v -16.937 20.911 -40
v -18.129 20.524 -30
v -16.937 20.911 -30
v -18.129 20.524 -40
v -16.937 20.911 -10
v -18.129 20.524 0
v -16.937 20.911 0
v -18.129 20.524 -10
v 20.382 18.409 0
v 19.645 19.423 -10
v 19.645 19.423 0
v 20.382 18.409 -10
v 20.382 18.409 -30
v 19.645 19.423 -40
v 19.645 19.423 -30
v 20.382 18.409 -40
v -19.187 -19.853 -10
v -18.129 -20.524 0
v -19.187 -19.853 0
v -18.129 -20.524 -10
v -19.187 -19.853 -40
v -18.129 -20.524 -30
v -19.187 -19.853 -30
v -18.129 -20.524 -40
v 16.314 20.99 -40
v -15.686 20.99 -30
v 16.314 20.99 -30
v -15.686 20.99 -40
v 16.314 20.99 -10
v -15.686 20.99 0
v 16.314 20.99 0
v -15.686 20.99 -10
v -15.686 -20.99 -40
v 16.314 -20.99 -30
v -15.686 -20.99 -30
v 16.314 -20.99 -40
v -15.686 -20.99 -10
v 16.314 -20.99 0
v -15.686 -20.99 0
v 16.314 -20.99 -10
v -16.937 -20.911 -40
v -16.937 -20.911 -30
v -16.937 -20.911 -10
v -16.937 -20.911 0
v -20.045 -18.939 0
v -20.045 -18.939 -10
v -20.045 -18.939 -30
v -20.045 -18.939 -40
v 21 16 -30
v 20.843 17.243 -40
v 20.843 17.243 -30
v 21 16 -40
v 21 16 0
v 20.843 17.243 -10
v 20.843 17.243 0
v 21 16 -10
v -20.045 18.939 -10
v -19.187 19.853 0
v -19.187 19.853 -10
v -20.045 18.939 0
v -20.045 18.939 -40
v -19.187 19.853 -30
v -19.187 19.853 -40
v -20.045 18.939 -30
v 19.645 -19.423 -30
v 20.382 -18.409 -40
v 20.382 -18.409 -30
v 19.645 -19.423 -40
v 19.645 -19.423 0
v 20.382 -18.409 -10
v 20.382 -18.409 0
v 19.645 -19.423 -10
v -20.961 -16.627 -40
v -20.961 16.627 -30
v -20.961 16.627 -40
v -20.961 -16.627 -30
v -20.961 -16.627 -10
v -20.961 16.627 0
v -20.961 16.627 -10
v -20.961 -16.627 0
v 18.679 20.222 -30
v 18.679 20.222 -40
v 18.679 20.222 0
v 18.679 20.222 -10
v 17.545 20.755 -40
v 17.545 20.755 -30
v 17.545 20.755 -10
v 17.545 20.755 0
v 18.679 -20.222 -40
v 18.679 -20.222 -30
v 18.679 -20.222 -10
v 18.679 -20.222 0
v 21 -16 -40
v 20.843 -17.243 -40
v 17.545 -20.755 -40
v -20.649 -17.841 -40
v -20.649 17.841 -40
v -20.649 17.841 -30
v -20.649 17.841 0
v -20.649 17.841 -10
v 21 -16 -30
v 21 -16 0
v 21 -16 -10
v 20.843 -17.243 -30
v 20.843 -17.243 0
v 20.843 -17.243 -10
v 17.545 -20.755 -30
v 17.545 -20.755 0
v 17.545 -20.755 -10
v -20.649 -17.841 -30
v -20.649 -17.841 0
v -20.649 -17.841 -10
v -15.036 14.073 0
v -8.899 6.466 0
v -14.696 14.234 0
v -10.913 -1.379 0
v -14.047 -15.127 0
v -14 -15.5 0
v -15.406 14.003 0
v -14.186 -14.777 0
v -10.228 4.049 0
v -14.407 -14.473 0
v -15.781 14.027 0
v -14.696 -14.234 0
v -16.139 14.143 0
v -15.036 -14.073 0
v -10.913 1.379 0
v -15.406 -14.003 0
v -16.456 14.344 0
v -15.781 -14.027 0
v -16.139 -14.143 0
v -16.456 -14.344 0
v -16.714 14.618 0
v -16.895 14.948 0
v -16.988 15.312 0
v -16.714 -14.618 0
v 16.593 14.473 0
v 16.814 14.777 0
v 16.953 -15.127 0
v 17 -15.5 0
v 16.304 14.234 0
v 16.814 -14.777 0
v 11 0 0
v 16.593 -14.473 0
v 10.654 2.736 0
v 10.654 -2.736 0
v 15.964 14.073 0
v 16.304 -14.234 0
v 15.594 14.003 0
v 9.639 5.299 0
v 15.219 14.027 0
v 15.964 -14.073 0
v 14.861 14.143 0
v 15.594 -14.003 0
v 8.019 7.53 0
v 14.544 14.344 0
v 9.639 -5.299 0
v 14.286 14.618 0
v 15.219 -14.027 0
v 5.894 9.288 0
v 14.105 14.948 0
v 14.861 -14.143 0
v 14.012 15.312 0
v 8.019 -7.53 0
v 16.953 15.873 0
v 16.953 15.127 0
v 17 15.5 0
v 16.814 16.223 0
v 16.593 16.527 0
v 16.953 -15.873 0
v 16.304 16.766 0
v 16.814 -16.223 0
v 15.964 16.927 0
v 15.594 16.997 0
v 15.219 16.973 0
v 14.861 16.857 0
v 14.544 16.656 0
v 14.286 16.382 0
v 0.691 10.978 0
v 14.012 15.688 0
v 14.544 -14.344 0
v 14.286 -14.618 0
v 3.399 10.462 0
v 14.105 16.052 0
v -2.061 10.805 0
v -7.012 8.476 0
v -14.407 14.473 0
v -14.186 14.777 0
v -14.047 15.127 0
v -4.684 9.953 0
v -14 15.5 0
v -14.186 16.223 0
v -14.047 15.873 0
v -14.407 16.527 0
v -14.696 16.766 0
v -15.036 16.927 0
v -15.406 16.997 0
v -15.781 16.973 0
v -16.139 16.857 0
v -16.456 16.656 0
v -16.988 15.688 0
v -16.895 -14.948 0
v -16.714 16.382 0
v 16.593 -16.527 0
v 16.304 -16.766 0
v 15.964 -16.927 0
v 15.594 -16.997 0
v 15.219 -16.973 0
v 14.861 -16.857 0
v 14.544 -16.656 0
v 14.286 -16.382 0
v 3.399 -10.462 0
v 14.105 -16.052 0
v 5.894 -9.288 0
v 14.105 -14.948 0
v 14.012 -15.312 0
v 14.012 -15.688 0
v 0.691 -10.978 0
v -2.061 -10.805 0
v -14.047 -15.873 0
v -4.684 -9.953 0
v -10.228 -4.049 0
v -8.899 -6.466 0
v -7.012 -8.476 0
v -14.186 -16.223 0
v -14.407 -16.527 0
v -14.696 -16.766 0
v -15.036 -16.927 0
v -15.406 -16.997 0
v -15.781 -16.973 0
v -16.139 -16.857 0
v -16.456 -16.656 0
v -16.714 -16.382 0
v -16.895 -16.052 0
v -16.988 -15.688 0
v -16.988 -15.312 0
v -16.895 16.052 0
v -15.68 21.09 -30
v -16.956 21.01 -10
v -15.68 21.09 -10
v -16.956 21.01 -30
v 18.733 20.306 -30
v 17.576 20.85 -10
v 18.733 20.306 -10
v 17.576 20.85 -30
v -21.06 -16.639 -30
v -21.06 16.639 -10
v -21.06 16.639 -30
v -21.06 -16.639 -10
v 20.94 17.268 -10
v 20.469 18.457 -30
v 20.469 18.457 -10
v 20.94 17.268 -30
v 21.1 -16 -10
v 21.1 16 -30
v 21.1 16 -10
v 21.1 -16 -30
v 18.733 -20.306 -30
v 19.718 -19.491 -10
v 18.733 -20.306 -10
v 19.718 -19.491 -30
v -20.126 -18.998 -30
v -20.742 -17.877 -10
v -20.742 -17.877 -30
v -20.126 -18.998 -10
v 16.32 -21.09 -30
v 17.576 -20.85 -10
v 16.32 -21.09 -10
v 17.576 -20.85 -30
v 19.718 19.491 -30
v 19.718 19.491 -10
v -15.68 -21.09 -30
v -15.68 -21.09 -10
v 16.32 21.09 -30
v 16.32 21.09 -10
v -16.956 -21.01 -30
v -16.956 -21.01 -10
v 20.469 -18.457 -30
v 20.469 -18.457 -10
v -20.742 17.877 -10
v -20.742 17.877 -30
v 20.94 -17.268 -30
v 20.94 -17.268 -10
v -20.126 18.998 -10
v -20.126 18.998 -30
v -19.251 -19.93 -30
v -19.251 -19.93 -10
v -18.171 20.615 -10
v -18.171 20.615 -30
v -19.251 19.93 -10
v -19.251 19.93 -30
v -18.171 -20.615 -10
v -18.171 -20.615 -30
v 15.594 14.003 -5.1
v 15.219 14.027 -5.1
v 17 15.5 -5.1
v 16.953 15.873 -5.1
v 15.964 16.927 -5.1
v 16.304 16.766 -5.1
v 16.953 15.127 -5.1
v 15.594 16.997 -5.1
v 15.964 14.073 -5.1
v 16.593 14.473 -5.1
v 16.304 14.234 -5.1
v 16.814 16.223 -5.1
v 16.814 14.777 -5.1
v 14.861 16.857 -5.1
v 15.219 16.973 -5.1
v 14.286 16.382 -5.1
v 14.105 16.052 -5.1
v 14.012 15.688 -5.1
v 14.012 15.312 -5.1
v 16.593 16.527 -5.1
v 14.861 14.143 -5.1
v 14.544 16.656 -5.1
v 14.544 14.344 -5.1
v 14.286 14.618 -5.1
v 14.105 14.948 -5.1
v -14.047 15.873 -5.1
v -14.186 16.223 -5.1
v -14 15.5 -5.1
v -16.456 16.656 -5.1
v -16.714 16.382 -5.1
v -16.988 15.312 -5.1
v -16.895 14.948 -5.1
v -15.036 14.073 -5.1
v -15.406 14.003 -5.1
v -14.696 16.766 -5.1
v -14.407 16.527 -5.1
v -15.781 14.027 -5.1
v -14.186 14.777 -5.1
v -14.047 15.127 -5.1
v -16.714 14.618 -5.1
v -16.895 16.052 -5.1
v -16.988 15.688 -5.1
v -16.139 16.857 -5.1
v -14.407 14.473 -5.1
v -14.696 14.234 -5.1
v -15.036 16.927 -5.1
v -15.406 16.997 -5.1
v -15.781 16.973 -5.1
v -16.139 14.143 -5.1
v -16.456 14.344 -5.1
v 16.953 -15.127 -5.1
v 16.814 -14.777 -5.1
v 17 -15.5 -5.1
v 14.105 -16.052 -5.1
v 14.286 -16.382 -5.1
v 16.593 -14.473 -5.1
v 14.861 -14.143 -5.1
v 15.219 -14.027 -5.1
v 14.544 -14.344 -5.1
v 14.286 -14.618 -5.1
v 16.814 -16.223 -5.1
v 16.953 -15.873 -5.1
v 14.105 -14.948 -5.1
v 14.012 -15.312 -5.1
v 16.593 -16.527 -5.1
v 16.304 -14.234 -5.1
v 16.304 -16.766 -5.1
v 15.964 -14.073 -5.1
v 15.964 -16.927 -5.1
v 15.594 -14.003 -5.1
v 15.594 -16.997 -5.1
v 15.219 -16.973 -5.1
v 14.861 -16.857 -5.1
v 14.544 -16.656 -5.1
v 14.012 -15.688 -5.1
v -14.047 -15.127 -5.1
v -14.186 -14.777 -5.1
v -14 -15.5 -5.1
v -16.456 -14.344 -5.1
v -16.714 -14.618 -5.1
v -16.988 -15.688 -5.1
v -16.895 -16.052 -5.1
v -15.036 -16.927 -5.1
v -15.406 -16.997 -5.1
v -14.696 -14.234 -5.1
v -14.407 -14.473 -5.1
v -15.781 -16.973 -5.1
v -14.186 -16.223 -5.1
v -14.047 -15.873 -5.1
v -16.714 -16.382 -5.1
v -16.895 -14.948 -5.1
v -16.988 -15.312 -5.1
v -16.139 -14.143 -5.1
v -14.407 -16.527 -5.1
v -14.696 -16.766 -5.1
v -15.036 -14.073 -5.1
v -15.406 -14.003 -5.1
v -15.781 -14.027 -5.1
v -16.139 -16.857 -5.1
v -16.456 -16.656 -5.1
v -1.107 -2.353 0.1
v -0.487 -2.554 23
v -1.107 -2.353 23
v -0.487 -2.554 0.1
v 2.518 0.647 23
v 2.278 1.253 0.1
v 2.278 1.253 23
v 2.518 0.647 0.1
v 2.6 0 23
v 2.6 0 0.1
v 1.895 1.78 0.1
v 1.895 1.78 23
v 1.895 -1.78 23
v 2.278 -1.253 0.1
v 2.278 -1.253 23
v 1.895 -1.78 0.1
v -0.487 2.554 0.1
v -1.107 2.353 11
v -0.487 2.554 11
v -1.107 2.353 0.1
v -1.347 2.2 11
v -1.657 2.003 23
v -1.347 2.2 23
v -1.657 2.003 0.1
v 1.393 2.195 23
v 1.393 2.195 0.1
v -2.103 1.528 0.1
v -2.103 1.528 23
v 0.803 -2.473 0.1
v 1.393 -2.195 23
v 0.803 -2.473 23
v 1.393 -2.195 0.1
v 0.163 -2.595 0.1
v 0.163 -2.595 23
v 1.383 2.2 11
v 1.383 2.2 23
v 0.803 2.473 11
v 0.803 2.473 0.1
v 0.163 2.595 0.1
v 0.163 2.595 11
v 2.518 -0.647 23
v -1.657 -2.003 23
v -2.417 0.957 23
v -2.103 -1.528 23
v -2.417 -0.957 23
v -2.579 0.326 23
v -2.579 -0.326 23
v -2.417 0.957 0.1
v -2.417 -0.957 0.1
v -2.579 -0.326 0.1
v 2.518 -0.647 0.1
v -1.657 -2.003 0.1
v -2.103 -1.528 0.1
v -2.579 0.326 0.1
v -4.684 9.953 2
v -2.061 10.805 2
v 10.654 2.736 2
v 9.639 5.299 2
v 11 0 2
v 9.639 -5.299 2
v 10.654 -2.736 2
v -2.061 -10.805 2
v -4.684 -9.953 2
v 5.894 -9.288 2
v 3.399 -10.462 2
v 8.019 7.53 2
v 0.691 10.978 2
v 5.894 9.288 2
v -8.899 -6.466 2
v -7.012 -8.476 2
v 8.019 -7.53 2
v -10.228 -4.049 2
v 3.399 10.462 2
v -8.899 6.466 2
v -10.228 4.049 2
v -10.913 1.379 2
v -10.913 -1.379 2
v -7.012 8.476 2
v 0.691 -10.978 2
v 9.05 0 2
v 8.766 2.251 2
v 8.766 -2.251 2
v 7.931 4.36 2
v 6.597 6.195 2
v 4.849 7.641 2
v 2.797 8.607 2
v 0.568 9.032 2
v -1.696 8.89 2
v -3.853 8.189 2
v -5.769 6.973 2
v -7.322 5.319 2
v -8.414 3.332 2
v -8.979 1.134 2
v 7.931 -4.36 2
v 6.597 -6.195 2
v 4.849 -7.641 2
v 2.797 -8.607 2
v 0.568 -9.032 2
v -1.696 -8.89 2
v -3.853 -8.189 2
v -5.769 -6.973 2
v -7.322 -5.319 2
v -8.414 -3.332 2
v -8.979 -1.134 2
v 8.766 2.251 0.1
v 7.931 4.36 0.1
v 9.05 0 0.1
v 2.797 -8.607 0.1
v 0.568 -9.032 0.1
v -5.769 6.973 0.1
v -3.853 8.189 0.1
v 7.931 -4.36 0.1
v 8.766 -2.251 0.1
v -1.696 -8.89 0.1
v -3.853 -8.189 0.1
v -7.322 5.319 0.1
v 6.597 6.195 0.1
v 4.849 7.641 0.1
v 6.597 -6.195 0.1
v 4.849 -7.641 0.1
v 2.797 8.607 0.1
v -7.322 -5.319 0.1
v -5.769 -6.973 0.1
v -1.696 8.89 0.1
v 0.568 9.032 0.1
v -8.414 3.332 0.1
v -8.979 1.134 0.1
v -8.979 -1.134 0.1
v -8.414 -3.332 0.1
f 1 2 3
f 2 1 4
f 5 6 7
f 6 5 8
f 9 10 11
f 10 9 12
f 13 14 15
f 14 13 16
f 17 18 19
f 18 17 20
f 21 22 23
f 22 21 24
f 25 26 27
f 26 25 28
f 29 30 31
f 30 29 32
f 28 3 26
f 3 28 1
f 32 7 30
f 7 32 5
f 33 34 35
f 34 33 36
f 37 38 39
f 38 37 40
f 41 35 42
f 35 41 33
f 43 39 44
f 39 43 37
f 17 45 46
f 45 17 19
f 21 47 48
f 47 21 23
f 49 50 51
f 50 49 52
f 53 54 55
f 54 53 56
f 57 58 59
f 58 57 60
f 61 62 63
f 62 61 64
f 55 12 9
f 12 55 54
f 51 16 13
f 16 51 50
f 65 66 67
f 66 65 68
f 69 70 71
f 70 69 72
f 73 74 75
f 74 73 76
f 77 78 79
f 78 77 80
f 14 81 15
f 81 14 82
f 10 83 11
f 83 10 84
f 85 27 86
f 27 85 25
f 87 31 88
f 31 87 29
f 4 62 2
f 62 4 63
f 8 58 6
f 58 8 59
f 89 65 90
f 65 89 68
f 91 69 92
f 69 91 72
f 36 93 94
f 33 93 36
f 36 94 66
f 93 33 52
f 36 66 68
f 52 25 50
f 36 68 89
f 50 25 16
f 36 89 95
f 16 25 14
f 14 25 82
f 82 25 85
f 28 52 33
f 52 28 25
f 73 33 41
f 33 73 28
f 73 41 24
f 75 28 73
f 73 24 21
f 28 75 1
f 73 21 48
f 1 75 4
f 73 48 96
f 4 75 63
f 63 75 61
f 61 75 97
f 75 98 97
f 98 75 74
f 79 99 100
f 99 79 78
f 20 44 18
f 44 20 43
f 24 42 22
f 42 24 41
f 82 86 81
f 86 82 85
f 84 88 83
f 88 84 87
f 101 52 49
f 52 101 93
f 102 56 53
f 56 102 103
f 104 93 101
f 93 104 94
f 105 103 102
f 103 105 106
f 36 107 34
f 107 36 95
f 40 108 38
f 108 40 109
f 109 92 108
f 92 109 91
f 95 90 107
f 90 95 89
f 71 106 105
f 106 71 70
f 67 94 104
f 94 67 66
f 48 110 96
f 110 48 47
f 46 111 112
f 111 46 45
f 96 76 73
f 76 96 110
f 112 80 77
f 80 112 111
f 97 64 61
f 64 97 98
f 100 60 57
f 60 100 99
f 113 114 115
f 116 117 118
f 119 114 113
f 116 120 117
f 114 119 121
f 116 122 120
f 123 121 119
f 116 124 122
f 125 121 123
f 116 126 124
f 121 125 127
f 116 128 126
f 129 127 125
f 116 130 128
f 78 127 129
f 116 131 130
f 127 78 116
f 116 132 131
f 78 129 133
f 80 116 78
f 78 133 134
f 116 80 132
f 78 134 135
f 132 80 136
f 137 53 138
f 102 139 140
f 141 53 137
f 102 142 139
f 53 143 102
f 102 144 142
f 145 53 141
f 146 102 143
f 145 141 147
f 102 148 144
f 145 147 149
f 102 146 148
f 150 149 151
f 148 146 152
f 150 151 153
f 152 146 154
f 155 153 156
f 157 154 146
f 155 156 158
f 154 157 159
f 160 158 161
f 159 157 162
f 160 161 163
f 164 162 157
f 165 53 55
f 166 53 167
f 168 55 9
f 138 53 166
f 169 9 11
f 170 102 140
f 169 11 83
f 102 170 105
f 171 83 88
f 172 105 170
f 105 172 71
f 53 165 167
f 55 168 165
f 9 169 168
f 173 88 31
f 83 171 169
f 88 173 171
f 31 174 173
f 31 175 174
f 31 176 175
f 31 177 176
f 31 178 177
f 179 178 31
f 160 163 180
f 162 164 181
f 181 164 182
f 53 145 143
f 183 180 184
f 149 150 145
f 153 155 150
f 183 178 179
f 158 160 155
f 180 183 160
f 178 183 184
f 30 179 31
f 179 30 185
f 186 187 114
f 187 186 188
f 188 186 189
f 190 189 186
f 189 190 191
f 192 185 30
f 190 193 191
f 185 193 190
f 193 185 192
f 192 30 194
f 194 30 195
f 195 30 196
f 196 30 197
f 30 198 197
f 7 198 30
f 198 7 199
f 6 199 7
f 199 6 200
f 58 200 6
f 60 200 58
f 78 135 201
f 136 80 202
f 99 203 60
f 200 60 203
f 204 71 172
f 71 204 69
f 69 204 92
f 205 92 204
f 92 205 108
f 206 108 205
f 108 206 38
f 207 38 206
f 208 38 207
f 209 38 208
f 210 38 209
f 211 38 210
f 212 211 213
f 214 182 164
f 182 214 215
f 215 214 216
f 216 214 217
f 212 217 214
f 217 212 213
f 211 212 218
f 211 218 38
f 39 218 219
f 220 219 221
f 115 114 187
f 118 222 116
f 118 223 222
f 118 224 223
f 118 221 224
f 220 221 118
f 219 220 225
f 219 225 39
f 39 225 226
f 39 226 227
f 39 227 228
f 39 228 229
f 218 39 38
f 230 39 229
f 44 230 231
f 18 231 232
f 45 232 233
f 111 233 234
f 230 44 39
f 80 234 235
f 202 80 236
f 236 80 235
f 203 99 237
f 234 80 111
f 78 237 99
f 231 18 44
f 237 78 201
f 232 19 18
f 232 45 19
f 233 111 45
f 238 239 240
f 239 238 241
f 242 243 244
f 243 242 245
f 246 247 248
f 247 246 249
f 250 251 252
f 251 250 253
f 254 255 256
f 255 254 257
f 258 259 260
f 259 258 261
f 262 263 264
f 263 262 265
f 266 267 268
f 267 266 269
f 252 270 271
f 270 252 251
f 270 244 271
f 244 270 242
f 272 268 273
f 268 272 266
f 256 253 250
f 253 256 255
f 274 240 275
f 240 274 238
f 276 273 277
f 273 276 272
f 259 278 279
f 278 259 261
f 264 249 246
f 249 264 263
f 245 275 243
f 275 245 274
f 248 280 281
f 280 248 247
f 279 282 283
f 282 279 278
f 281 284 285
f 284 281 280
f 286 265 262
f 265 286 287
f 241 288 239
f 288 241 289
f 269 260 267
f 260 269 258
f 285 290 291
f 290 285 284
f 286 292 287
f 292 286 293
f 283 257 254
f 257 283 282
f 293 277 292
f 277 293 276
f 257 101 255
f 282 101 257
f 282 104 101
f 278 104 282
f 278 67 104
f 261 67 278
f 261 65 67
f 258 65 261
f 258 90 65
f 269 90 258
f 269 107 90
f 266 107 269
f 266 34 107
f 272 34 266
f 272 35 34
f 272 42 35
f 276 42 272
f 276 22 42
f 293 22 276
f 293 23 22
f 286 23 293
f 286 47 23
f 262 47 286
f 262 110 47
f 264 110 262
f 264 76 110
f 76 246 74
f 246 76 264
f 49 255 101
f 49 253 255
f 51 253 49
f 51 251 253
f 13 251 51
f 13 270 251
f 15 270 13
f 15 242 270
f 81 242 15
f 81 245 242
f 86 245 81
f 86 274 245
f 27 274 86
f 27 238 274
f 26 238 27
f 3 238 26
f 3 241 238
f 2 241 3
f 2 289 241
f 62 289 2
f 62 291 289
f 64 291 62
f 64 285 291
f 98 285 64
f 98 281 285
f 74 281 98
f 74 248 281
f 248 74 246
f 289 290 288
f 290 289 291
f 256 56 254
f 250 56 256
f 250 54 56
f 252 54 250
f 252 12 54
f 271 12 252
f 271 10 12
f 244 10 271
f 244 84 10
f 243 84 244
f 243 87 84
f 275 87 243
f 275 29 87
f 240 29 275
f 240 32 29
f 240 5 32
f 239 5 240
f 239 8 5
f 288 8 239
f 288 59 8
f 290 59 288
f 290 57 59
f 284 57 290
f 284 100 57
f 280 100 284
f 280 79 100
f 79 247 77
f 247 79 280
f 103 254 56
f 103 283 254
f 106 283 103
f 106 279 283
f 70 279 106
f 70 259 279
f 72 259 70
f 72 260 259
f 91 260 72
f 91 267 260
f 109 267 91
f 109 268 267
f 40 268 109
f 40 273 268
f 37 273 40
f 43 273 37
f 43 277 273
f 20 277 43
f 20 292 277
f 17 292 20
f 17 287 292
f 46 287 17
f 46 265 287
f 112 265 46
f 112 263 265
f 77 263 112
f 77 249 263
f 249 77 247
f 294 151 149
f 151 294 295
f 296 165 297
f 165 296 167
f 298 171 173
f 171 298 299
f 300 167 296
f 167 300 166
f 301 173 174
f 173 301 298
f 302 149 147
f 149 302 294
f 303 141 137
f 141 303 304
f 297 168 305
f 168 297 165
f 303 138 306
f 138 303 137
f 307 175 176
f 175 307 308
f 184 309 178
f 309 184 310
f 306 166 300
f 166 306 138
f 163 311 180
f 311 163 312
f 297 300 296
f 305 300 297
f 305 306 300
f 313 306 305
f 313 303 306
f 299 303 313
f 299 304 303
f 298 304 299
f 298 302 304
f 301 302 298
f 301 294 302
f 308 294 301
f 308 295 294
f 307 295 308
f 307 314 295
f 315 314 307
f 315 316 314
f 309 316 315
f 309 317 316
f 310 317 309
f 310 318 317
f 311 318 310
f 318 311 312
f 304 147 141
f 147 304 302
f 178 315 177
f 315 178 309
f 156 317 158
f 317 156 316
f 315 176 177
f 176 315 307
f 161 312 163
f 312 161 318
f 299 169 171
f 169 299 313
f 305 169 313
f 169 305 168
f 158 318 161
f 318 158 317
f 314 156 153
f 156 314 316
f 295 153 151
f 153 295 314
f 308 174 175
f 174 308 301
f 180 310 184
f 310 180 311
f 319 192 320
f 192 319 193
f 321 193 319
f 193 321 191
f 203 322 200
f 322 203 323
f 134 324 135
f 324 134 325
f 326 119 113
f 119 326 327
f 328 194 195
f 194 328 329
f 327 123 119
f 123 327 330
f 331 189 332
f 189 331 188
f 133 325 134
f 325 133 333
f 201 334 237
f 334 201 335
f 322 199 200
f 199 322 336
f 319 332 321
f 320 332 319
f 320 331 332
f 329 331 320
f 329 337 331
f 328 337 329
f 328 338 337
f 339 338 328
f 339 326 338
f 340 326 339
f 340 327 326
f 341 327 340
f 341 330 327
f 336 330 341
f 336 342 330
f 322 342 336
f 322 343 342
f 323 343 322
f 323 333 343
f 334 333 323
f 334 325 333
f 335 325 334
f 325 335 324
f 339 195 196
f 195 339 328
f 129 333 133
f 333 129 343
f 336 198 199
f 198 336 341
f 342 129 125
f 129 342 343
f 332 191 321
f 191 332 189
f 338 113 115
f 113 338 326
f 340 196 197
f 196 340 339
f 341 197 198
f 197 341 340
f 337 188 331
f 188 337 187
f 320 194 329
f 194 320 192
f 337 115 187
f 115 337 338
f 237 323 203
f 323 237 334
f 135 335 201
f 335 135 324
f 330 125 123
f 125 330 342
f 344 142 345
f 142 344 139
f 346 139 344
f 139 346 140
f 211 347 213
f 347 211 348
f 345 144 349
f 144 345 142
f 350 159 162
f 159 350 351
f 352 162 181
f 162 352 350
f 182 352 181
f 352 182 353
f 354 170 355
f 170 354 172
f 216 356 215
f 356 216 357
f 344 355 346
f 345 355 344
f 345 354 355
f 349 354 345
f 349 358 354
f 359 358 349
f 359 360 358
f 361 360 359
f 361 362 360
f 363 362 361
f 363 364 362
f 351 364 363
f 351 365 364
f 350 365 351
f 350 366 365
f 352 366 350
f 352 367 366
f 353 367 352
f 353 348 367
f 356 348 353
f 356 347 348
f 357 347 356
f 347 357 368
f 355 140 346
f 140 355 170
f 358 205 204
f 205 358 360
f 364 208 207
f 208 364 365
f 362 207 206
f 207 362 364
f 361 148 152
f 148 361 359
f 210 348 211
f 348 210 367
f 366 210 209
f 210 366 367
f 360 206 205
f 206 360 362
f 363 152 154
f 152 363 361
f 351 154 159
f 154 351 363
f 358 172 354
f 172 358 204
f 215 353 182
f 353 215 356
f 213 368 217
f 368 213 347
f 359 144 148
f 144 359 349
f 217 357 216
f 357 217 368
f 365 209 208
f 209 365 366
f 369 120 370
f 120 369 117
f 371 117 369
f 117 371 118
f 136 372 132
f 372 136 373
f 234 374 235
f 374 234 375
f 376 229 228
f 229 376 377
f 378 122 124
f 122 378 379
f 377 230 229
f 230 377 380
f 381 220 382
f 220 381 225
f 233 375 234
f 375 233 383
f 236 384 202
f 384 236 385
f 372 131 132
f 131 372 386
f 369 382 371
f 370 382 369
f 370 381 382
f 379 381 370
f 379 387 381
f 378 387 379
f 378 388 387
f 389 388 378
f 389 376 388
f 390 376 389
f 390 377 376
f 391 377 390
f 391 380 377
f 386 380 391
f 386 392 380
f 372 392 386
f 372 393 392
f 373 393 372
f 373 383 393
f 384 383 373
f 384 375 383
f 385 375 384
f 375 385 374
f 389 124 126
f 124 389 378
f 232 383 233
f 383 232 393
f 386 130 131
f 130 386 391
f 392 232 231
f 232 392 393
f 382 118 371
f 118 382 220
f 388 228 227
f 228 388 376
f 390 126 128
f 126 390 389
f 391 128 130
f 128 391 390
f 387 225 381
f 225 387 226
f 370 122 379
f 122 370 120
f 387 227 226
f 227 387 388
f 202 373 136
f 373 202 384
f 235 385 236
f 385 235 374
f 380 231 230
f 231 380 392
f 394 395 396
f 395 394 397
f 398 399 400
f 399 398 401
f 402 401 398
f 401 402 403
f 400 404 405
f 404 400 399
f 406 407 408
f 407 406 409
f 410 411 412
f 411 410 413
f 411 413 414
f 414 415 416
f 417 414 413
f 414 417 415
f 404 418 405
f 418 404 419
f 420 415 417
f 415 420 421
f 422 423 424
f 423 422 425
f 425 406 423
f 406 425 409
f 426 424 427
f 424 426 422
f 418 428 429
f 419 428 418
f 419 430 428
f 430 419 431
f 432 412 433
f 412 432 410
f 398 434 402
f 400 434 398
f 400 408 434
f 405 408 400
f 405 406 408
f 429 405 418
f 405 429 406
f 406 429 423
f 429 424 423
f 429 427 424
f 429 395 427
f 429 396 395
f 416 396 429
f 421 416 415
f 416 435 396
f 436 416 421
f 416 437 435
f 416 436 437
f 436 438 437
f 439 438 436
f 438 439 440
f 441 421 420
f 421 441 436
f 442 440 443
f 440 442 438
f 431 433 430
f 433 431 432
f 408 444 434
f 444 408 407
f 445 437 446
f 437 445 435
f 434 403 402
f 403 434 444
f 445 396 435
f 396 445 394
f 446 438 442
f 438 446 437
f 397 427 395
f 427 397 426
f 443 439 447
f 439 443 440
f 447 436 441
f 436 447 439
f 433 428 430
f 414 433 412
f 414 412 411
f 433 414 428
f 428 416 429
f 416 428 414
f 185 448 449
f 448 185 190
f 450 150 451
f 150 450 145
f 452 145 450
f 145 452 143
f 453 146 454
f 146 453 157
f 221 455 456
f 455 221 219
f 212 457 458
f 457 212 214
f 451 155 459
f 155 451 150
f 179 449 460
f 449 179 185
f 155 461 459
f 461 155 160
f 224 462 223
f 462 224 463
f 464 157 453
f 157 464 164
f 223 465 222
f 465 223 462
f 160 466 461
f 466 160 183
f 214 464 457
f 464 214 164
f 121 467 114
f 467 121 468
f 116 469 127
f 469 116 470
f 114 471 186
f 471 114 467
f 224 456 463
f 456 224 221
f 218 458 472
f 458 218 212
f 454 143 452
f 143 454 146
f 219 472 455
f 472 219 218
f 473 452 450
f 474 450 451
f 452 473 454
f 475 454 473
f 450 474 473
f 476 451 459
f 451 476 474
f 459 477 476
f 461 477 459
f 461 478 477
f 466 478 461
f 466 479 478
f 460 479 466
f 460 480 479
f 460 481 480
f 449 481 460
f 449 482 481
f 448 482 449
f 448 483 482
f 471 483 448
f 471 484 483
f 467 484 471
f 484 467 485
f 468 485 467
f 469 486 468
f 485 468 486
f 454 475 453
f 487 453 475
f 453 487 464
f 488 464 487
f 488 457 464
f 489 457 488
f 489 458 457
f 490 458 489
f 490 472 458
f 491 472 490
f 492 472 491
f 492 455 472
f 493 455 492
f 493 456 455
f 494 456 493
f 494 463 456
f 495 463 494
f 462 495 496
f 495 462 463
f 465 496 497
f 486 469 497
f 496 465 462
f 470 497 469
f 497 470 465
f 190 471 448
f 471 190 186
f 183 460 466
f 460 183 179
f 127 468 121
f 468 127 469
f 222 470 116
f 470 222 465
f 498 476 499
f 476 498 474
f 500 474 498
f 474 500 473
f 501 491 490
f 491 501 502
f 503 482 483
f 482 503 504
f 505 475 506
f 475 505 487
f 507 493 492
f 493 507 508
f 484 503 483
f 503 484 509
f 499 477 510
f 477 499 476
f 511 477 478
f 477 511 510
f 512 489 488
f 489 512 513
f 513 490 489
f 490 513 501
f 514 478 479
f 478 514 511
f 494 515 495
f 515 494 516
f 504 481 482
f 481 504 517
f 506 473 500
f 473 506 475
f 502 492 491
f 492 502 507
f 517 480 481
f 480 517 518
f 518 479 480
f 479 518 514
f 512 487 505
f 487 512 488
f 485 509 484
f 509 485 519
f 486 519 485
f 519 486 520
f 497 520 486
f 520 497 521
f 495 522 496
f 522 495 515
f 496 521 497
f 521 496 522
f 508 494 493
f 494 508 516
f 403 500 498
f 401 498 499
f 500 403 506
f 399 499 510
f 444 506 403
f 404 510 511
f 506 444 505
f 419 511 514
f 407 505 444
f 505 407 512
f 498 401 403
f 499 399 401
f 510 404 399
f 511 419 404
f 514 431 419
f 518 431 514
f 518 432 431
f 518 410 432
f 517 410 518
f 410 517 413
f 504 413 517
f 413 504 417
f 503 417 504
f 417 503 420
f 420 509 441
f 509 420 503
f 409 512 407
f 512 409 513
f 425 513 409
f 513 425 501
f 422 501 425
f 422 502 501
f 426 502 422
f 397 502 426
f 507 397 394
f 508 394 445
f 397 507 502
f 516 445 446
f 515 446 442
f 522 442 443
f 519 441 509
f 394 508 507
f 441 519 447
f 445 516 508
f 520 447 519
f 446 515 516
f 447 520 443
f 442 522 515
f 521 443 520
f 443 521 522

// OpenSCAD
$fn=25;

module nema_17(motor_height = 40, shaft_diameter = 5.2, shaft_flat = 0.2)
{
    rotate(a=90, v=[-1,0,0])
    nema(motor_size = 42, motor_height = 40, shaft_diameter = 5.2, shaft_flat = 0.2);
}

nema_17();

module nema(motor_size=42, motor_height = 38, shaft_diameter = 5.2, shaft_flat = 0.2) {

realDelta = 6;

	difference() {

    union()
    {
        color("silver")
        // Motor base
		translate([0,motor_height/2,0]) rotate([90,0,0]) hull() {
			translate([-(motor_size/2-5),(motor_size/2-5),0]) cylinder(r=5,h=motor_height, center = true);
			translate([(motor_size/2-5),(motor_size/2-5),0]) cylinder(r=5,h=motor_height, center = true);
			translate([-(motor_size/2-5),-(motor_size/2-5),0]) cylinder(r=5,h=motor_height, center = true);
			translate([(motor_size/2-5),-(motor_size/2-5),0]) cylinder(r=5,h=motor_height, center = true);
		}
        color("black")
        translate([0,motor_height/2,0]) rotate([90,0,0]) hull() {
            translate([-(motor_size/2-5),(motor_size/2-5),0]) cylinder(r=5.1,h=motor_height/2, center = true);
            translate([(motor_size/2-5),(motor_size/2-5),0]) cylinder(r=5.1,h=motor_height/2, center = true);
            translate([-(motor_size/2-5),-(motor_size/2-5),0]) cylinder(r=5.1,h=motor_height/2, center = true);
            translate([(motor_size/2-5),-(motor_size/2-5),0]) cylinder(r=5.1,h=motor_height/2, center = true);
        }
    }


        // Mount holes
        union() {
		translate([15.5,0.1,15.5]) rotate([90,0,0]) cylinder(r=1.5,h=10, center = true);
		translate([-15.5,0.1,15.5]) rotate([90,0,0]) cylinder(r=1.5,h=10, center = true);
		translate([15.5,0.1,-15.5]) rotate([90,0,0]) cylinder(r=1.5,h=10, center = true);
		translate([-15.5,0.1,-15.5]) rotate([90,0,0]) cylinder(r=1.5,h=10, center = true);
        }
	}
    color("silver")
    // Motor shaft
	translate([0,-10,0]) rotate([90,0,0])
    difference() {    
        cylinder(r=shaft_diameter/2,h=20+realDelta, center = true); 
        translate([-shaft_diameter/2,(shaft_diameter/2)-shaft_flat*2,1])
        cube([shaft_diameter,shaft_diameter/2,10+realDelta]);
    }
    color("gray")
    // The ring around the motor shaft
	difference() {
		translate([0,-1,0]) rotate([90,0,0]) cylinder(r=11,h=2, center = true);
		translate([0,-1.1,0]) rotate([90,0,0]) cylinder(r=9.05,h=2, center = true);
	}
}

module nema_holes(places=[1,1,1,1], size=15.5, h=10, holes=false, shadow=false, $fn=8){
    for (i=[0:3]) {
        if (places[i] == 1) {
            rotate([0, 0, 90*i]) translate([size, size, 0]) {
                if (holes) {
                    rotate([0, 0, -90*i]) translate([0,0,0]) rotate([0,0,90]) cylinder_poly(h = h+0.1, r = M3/2);
					rotate([0, 0, -90*i]) translate([0,0,h]) rotate([0,0,22.5]) cylinder(h = h, r = M3*2.2/2, $fn = $fn);
                } else {
                    rotate([0, 0, -90*i]) cylinder(h=h, r=4, $fn=$fn);
                }
            }
        }
    }
    if (shadow != false) {
        %translate ([0, 0, -19]) cube([42,42,38], center = true);
    //flange
        translate ([0, 0, 0]) cylinder(r=22.6/2,h=h*2, center = false, $fn=20);
    //shaft
        %translate ([0, 0, 0]) cylinder(r=2.5,h=14, center = false);
    }
}
